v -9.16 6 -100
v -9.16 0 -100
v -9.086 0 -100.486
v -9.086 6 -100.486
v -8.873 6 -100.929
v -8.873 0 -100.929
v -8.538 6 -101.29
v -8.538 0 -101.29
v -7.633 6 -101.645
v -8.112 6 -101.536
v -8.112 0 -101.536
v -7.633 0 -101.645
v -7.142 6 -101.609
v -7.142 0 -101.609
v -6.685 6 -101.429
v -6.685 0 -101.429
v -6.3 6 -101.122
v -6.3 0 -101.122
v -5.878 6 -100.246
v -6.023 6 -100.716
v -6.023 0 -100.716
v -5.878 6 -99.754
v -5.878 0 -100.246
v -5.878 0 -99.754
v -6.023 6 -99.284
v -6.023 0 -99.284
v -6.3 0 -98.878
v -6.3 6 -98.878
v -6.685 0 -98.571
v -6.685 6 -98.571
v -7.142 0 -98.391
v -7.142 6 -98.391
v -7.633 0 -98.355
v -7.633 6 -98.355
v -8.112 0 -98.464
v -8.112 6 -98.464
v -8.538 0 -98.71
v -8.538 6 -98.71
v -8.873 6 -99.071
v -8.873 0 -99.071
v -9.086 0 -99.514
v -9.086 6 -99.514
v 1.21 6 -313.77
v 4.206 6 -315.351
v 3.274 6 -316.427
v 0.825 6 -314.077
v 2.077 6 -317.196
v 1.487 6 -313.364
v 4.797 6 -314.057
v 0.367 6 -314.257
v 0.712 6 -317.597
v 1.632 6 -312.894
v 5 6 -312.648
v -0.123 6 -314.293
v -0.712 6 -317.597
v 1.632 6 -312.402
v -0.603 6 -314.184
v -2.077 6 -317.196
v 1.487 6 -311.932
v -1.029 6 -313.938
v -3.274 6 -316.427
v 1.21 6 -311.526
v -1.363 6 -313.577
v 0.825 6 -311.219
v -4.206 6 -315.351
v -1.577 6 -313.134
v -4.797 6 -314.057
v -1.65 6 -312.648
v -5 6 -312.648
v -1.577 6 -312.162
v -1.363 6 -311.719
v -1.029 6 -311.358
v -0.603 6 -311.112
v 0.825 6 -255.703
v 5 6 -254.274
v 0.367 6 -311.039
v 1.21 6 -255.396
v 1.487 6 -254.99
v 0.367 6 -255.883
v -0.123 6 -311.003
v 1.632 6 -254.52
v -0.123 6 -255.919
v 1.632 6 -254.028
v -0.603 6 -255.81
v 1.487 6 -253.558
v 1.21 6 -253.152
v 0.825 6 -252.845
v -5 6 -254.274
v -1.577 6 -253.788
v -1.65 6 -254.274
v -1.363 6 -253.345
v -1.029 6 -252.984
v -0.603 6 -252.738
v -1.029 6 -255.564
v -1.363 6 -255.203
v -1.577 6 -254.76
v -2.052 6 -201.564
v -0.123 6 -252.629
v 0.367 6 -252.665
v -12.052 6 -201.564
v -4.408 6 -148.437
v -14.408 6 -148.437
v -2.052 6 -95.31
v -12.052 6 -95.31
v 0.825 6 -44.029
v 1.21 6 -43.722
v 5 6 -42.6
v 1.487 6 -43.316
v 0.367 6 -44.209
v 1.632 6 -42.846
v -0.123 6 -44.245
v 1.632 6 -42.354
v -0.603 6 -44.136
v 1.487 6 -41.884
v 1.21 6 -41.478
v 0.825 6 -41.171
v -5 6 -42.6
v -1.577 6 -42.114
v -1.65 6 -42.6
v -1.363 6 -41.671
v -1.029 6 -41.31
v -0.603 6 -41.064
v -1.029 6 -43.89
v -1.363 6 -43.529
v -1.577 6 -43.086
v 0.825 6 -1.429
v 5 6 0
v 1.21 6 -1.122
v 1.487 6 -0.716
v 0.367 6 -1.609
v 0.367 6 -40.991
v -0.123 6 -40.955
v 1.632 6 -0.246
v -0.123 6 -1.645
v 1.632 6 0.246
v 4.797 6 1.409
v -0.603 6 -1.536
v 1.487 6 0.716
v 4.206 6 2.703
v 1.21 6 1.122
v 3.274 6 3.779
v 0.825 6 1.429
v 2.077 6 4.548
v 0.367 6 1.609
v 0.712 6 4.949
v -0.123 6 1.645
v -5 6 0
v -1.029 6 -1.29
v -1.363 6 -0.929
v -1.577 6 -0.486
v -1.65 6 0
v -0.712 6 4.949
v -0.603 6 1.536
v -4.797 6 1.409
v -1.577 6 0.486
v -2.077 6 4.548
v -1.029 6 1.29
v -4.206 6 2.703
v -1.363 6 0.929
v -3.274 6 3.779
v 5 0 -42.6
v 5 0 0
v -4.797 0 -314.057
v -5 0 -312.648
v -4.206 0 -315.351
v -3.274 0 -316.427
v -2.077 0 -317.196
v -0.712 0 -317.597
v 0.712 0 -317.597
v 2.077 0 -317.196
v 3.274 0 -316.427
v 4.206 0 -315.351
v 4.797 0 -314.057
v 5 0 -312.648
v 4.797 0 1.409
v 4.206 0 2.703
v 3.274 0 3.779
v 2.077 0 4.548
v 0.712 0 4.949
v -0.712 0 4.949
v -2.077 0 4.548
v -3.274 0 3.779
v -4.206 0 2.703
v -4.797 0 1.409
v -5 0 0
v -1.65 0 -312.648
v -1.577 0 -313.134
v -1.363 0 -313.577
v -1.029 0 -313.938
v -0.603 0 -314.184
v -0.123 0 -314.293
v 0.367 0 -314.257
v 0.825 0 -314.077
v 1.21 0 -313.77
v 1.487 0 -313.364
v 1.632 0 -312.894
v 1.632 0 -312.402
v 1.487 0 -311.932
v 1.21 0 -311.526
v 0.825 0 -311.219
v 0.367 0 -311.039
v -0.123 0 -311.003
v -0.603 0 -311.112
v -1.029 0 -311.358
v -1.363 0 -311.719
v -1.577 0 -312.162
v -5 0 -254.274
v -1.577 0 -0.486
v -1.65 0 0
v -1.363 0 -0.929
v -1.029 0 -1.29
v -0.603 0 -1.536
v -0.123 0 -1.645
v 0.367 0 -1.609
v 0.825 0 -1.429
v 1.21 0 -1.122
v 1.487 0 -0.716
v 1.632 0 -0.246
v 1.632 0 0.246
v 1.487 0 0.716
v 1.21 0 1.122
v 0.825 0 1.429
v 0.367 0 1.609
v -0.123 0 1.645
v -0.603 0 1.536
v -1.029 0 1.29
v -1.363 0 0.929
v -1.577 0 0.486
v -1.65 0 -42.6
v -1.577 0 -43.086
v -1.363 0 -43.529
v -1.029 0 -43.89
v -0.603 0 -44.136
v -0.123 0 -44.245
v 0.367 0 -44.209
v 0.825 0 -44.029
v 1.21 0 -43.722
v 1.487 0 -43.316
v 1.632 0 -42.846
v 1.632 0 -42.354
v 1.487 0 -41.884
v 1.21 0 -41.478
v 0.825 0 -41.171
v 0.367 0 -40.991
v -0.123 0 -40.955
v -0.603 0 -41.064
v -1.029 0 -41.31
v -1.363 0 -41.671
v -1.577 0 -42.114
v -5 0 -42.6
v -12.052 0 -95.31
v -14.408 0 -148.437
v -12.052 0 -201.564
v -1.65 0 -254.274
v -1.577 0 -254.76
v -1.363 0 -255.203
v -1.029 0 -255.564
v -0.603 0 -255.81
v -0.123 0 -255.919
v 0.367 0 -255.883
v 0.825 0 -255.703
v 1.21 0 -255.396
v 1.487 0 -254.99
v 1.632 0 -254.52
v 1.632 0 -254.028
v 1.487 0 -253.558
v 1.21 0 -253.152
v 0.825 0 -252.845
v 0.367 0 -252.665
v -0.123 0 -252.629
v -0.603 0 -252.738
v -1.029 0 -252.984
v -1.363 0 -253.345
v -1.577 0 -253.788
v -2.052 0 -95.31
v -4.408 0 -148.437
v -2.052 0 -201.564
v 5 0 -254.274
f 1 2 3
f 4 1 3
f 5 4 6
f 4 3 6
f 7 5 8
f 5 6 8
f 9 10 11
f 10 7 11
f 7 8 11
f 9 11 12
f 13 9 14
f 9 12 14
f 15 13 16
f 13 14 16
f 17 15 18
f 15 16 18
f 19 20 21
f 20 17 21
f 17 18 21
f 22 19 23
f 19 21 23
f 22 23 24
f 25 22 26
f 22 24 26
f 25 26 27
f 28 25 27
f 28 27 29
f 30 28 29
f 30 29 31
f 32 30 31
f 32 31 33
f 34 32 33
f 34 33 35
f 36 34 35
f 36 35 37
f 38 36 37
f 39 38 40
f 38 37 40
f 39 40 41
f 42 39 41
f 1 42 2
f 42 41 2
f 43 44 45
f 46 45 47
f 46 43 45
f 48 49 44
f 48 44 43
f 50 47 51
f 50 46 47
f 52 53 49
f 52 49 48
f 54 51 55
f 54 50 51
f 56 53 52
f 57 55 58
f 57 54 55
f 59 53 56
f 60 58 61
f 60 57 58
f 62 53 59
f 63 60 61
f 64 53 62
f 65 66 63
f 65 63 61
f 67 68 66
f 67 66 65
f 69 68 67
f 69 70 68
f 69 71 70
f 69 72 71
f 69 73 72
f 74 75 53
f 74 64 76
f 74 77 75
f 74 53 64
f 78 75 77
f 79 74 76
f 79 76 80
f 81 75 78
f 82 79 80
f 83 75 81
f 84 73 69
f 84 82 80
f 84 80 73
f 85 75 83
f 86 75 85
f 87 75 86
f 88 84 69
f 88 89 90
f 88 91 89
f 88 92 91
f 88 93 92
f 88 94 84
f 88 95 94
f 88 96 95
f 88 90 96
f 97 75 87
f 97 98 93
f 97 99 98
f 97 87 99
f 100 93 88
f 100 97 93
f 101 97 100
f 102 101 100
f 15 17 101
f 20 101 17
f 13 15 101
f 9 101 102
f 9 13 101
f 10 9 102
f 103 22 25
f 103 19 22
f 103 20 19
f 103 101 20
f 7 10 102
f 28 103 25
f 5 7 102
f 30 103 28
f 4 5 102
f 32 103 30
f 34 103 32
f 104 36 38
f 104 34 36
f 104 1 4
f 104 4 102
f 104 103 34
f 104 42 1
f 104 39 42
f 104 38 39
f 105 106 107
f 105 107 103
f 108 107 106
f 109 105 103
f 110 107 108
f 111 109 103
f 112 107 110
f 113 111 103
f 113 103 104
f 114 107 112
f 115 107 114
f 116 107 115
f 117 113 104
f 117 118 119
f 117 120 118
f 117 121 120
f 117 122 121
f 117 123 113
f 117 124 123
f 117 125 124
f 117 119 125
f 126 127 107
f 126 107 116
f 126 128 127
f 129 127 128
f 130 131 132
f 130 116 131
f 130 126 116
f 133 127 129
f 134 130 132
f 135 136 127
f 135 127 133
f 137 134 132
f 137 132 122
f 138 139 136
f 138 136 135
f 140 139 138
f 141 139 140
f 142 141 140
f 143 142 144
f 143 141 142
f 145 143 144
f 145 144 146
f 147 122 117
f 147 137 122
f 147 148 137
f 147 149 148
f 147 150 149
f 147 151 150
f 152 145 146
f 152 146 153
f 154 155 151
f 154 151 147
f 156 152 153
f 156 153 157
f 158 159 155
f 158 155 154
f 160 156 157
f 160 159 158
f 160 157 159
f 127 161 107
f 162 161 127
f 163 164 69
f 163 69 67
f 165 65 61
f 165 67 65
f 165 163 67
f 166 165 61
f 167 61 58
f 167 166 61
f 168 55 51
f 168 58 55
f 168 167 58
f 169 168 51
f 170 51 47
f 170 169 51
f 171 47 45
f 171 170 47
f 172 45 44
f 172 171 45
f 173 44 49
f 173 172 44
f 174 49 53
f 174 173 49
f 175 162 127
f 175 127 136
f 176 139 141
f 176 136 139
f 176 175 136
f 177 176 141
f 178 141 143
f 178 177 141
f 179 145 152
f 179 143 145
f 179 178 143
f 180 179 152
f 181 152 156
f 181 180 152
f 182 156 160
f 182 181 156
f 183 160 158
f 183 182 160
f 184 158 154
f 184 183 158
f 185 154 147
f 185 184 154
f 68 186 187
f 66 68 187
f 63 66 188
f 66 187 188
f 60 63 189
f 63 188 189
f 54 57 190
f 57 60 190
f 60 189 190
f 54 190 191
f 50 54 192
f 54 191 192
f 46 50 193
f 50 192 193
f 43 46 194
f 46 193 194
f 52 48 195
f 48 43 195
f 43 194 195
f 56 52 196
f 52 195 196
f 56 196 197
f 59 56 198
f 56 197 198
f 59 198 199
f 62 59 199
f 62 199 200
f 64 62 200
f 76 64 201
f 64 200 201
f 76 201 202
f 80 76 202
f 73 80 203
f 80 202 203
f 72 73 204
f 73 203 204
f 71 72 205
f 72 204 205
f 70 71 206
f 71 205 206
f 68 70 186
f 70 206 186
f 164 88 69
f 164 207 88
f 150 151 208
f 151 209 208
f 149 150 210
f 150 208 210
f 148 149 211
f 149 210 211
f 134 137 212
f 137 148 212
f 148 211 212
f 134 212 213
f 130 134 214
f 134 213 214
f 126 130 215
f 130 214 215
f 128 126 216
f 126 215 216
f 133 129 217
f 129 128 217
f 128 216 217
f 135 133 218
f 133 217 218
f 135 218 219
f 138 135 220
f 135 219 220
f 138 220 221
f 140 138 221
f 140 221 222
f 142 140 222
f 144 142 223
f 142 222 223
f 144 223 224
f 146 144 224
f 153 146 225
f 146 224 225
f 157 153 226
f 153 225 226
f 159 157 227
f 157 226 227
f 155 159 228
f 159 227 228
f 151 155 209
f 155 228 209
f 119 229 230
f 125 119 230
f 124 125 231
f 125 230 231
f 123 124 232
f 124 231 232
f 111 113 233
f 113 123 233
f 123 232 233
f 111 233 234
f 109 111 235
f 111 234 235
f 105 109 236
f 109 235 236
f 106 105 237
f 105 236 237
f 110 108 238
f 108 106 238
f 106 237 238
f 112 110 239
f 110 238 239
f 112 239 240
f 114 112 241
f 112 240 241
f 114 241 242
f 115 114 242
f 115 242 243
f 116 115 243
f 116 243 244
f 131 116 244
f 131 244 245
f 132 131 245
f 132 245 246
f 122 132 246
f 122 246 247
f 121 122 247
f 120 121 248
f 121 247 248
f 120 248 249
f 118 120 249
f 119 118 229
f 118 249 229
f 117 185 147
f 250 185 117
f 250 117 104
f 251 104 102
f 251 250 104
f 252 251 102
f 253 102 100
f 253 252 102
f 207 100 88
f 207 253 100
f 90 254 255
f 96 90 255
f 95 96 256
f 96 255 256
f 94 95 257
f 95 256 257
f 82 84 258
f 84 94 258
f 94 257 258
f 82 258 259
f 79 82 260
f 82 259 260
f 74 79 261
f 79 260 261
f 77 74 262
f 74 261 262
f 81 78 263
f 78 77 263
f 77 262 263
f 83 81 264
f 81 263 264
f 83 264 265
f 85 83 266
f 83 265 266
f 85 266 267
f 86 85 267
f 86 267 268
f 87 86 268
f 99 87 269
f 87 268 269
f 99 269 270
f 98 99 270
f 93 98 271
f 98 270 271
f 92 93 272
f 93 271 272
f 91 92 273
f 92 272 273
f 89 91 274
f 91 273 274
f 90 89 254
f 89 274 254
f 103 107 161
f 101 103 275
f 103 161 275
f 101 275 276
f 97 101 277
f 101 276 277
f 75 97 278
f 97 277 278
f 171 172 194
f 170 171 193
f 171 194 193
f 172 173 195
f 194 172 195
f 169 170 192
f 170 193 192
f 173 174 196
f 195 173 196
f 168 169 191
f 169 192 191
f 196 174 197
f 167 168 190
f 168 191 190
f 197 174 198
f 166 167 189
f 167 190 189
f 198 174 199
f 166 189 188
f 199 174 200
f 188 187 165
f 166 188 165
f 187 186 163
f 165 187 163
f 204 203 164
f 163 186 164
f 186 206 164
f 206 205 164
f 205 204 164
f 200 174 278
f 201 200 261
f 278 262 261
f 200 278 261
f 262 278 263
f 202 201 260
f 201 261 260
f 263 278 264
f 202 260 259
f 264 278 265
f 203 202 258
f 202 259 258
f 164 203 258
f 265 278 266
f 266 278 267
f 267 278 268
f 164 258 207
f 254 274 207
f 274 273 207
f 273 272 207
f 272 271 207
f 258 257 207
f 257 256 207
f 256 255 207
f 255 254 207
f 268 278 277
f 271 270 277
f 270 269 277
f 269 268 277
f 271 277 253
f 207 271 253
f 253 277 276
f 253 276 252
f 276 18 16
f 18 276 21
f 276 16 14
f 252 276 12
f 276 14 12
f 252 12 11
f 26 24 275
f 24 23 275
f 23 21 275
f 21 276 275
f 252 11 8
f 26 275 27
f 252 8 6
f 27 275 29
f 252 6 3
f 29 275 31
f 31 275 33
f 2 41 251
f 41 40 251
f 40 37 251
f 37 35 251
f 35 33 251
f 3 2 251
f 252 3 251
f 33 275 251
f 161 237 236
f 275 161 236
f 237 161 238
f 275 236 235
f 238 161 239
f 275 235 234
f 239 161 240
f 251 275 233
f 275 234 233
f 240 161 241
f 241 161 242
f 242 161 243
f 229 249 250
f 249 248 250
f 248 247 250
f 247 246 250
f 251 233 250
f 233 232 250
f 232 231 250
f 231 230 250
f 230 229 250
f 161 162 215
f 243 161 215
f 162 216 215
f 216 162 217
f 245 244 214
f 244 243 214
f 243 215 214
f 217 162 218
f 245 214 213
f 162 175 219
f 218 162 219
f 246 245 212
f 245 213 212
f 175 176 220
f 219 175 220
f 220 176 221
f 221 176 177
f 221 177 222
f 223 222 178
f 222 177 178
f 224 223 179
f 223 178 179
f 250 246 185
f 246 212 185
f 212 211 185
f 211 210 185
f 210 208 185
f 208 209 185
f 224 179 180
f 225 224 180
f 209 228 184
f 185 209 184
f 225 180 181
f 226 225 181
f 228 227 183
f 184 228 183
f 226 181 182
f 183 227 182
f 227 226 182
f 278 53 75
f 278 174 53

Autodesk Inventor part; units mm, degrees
ref_plane "YZ Plane" through (0, 0, 0) normal (1, 0, 0) x (0, 1, 0)
ref_plane "XZ Plane" through (0, 0, 0) normal (0, 1, 0) x (-1, 0, 0)
ref_plane "XY Plane" through (0, 0, 0) normal (0, 0, 1) x (1, 0, 0)
sketch "Sketch1" plane through (0, 0, 0) normal (0, 1, 0) x (-1, 0, 0)
  line L0 (0, 0) -> (0, -312.648) construction
  line L1 (5, 0) -> (5, -312.648)
  line L2 (-5, -312.648) -> (-5, 0)
  arc A0 (5, 0) -> (-5, 0) centre (0, 0) ccw
  arc A1 (-5, -312.648) -> (5, -312.648) centre (0, -312.648) ccw
  circle A2 centre (0, 0) radius 1.65
  circle A3 centre (0, -312.648) radius 1.65
  circle A4 centre (0, -42.6) radius 1.65
  circle A5 centre (0, -254.274) radius 1.65
  arc A6 (5, -254.274) -> (5, -42.6) centre (-585.5917, -148.437) ccw
  arc A7 (-5, -254.274) -> (-5, -42.6) centre (-595.5917, -148.437) ccw
  circle A8 centre (7.5096, -100) radius 1.65
  point P0 (0, -156.324)
  dimension "d0" = 3.3
  dimension "d1" = 3.3
  dimension "d2" = 10
  dimension "d3" = 312.648
  dimension "d10" = 3.3
  dimension "d11" = 42.6
  dimension "d12" = 3.3
  dimension "d13" = 254.274
  dimension "d16" = 600
  dimension "d17" = 600
  dimension "d18" = 3.3
  dimension "d19" = 100
extrude "Extrusion1" add sketch "Sketch1" along normal blind 6 contours L1 A1 L2 A7 A0 | A6 L1
